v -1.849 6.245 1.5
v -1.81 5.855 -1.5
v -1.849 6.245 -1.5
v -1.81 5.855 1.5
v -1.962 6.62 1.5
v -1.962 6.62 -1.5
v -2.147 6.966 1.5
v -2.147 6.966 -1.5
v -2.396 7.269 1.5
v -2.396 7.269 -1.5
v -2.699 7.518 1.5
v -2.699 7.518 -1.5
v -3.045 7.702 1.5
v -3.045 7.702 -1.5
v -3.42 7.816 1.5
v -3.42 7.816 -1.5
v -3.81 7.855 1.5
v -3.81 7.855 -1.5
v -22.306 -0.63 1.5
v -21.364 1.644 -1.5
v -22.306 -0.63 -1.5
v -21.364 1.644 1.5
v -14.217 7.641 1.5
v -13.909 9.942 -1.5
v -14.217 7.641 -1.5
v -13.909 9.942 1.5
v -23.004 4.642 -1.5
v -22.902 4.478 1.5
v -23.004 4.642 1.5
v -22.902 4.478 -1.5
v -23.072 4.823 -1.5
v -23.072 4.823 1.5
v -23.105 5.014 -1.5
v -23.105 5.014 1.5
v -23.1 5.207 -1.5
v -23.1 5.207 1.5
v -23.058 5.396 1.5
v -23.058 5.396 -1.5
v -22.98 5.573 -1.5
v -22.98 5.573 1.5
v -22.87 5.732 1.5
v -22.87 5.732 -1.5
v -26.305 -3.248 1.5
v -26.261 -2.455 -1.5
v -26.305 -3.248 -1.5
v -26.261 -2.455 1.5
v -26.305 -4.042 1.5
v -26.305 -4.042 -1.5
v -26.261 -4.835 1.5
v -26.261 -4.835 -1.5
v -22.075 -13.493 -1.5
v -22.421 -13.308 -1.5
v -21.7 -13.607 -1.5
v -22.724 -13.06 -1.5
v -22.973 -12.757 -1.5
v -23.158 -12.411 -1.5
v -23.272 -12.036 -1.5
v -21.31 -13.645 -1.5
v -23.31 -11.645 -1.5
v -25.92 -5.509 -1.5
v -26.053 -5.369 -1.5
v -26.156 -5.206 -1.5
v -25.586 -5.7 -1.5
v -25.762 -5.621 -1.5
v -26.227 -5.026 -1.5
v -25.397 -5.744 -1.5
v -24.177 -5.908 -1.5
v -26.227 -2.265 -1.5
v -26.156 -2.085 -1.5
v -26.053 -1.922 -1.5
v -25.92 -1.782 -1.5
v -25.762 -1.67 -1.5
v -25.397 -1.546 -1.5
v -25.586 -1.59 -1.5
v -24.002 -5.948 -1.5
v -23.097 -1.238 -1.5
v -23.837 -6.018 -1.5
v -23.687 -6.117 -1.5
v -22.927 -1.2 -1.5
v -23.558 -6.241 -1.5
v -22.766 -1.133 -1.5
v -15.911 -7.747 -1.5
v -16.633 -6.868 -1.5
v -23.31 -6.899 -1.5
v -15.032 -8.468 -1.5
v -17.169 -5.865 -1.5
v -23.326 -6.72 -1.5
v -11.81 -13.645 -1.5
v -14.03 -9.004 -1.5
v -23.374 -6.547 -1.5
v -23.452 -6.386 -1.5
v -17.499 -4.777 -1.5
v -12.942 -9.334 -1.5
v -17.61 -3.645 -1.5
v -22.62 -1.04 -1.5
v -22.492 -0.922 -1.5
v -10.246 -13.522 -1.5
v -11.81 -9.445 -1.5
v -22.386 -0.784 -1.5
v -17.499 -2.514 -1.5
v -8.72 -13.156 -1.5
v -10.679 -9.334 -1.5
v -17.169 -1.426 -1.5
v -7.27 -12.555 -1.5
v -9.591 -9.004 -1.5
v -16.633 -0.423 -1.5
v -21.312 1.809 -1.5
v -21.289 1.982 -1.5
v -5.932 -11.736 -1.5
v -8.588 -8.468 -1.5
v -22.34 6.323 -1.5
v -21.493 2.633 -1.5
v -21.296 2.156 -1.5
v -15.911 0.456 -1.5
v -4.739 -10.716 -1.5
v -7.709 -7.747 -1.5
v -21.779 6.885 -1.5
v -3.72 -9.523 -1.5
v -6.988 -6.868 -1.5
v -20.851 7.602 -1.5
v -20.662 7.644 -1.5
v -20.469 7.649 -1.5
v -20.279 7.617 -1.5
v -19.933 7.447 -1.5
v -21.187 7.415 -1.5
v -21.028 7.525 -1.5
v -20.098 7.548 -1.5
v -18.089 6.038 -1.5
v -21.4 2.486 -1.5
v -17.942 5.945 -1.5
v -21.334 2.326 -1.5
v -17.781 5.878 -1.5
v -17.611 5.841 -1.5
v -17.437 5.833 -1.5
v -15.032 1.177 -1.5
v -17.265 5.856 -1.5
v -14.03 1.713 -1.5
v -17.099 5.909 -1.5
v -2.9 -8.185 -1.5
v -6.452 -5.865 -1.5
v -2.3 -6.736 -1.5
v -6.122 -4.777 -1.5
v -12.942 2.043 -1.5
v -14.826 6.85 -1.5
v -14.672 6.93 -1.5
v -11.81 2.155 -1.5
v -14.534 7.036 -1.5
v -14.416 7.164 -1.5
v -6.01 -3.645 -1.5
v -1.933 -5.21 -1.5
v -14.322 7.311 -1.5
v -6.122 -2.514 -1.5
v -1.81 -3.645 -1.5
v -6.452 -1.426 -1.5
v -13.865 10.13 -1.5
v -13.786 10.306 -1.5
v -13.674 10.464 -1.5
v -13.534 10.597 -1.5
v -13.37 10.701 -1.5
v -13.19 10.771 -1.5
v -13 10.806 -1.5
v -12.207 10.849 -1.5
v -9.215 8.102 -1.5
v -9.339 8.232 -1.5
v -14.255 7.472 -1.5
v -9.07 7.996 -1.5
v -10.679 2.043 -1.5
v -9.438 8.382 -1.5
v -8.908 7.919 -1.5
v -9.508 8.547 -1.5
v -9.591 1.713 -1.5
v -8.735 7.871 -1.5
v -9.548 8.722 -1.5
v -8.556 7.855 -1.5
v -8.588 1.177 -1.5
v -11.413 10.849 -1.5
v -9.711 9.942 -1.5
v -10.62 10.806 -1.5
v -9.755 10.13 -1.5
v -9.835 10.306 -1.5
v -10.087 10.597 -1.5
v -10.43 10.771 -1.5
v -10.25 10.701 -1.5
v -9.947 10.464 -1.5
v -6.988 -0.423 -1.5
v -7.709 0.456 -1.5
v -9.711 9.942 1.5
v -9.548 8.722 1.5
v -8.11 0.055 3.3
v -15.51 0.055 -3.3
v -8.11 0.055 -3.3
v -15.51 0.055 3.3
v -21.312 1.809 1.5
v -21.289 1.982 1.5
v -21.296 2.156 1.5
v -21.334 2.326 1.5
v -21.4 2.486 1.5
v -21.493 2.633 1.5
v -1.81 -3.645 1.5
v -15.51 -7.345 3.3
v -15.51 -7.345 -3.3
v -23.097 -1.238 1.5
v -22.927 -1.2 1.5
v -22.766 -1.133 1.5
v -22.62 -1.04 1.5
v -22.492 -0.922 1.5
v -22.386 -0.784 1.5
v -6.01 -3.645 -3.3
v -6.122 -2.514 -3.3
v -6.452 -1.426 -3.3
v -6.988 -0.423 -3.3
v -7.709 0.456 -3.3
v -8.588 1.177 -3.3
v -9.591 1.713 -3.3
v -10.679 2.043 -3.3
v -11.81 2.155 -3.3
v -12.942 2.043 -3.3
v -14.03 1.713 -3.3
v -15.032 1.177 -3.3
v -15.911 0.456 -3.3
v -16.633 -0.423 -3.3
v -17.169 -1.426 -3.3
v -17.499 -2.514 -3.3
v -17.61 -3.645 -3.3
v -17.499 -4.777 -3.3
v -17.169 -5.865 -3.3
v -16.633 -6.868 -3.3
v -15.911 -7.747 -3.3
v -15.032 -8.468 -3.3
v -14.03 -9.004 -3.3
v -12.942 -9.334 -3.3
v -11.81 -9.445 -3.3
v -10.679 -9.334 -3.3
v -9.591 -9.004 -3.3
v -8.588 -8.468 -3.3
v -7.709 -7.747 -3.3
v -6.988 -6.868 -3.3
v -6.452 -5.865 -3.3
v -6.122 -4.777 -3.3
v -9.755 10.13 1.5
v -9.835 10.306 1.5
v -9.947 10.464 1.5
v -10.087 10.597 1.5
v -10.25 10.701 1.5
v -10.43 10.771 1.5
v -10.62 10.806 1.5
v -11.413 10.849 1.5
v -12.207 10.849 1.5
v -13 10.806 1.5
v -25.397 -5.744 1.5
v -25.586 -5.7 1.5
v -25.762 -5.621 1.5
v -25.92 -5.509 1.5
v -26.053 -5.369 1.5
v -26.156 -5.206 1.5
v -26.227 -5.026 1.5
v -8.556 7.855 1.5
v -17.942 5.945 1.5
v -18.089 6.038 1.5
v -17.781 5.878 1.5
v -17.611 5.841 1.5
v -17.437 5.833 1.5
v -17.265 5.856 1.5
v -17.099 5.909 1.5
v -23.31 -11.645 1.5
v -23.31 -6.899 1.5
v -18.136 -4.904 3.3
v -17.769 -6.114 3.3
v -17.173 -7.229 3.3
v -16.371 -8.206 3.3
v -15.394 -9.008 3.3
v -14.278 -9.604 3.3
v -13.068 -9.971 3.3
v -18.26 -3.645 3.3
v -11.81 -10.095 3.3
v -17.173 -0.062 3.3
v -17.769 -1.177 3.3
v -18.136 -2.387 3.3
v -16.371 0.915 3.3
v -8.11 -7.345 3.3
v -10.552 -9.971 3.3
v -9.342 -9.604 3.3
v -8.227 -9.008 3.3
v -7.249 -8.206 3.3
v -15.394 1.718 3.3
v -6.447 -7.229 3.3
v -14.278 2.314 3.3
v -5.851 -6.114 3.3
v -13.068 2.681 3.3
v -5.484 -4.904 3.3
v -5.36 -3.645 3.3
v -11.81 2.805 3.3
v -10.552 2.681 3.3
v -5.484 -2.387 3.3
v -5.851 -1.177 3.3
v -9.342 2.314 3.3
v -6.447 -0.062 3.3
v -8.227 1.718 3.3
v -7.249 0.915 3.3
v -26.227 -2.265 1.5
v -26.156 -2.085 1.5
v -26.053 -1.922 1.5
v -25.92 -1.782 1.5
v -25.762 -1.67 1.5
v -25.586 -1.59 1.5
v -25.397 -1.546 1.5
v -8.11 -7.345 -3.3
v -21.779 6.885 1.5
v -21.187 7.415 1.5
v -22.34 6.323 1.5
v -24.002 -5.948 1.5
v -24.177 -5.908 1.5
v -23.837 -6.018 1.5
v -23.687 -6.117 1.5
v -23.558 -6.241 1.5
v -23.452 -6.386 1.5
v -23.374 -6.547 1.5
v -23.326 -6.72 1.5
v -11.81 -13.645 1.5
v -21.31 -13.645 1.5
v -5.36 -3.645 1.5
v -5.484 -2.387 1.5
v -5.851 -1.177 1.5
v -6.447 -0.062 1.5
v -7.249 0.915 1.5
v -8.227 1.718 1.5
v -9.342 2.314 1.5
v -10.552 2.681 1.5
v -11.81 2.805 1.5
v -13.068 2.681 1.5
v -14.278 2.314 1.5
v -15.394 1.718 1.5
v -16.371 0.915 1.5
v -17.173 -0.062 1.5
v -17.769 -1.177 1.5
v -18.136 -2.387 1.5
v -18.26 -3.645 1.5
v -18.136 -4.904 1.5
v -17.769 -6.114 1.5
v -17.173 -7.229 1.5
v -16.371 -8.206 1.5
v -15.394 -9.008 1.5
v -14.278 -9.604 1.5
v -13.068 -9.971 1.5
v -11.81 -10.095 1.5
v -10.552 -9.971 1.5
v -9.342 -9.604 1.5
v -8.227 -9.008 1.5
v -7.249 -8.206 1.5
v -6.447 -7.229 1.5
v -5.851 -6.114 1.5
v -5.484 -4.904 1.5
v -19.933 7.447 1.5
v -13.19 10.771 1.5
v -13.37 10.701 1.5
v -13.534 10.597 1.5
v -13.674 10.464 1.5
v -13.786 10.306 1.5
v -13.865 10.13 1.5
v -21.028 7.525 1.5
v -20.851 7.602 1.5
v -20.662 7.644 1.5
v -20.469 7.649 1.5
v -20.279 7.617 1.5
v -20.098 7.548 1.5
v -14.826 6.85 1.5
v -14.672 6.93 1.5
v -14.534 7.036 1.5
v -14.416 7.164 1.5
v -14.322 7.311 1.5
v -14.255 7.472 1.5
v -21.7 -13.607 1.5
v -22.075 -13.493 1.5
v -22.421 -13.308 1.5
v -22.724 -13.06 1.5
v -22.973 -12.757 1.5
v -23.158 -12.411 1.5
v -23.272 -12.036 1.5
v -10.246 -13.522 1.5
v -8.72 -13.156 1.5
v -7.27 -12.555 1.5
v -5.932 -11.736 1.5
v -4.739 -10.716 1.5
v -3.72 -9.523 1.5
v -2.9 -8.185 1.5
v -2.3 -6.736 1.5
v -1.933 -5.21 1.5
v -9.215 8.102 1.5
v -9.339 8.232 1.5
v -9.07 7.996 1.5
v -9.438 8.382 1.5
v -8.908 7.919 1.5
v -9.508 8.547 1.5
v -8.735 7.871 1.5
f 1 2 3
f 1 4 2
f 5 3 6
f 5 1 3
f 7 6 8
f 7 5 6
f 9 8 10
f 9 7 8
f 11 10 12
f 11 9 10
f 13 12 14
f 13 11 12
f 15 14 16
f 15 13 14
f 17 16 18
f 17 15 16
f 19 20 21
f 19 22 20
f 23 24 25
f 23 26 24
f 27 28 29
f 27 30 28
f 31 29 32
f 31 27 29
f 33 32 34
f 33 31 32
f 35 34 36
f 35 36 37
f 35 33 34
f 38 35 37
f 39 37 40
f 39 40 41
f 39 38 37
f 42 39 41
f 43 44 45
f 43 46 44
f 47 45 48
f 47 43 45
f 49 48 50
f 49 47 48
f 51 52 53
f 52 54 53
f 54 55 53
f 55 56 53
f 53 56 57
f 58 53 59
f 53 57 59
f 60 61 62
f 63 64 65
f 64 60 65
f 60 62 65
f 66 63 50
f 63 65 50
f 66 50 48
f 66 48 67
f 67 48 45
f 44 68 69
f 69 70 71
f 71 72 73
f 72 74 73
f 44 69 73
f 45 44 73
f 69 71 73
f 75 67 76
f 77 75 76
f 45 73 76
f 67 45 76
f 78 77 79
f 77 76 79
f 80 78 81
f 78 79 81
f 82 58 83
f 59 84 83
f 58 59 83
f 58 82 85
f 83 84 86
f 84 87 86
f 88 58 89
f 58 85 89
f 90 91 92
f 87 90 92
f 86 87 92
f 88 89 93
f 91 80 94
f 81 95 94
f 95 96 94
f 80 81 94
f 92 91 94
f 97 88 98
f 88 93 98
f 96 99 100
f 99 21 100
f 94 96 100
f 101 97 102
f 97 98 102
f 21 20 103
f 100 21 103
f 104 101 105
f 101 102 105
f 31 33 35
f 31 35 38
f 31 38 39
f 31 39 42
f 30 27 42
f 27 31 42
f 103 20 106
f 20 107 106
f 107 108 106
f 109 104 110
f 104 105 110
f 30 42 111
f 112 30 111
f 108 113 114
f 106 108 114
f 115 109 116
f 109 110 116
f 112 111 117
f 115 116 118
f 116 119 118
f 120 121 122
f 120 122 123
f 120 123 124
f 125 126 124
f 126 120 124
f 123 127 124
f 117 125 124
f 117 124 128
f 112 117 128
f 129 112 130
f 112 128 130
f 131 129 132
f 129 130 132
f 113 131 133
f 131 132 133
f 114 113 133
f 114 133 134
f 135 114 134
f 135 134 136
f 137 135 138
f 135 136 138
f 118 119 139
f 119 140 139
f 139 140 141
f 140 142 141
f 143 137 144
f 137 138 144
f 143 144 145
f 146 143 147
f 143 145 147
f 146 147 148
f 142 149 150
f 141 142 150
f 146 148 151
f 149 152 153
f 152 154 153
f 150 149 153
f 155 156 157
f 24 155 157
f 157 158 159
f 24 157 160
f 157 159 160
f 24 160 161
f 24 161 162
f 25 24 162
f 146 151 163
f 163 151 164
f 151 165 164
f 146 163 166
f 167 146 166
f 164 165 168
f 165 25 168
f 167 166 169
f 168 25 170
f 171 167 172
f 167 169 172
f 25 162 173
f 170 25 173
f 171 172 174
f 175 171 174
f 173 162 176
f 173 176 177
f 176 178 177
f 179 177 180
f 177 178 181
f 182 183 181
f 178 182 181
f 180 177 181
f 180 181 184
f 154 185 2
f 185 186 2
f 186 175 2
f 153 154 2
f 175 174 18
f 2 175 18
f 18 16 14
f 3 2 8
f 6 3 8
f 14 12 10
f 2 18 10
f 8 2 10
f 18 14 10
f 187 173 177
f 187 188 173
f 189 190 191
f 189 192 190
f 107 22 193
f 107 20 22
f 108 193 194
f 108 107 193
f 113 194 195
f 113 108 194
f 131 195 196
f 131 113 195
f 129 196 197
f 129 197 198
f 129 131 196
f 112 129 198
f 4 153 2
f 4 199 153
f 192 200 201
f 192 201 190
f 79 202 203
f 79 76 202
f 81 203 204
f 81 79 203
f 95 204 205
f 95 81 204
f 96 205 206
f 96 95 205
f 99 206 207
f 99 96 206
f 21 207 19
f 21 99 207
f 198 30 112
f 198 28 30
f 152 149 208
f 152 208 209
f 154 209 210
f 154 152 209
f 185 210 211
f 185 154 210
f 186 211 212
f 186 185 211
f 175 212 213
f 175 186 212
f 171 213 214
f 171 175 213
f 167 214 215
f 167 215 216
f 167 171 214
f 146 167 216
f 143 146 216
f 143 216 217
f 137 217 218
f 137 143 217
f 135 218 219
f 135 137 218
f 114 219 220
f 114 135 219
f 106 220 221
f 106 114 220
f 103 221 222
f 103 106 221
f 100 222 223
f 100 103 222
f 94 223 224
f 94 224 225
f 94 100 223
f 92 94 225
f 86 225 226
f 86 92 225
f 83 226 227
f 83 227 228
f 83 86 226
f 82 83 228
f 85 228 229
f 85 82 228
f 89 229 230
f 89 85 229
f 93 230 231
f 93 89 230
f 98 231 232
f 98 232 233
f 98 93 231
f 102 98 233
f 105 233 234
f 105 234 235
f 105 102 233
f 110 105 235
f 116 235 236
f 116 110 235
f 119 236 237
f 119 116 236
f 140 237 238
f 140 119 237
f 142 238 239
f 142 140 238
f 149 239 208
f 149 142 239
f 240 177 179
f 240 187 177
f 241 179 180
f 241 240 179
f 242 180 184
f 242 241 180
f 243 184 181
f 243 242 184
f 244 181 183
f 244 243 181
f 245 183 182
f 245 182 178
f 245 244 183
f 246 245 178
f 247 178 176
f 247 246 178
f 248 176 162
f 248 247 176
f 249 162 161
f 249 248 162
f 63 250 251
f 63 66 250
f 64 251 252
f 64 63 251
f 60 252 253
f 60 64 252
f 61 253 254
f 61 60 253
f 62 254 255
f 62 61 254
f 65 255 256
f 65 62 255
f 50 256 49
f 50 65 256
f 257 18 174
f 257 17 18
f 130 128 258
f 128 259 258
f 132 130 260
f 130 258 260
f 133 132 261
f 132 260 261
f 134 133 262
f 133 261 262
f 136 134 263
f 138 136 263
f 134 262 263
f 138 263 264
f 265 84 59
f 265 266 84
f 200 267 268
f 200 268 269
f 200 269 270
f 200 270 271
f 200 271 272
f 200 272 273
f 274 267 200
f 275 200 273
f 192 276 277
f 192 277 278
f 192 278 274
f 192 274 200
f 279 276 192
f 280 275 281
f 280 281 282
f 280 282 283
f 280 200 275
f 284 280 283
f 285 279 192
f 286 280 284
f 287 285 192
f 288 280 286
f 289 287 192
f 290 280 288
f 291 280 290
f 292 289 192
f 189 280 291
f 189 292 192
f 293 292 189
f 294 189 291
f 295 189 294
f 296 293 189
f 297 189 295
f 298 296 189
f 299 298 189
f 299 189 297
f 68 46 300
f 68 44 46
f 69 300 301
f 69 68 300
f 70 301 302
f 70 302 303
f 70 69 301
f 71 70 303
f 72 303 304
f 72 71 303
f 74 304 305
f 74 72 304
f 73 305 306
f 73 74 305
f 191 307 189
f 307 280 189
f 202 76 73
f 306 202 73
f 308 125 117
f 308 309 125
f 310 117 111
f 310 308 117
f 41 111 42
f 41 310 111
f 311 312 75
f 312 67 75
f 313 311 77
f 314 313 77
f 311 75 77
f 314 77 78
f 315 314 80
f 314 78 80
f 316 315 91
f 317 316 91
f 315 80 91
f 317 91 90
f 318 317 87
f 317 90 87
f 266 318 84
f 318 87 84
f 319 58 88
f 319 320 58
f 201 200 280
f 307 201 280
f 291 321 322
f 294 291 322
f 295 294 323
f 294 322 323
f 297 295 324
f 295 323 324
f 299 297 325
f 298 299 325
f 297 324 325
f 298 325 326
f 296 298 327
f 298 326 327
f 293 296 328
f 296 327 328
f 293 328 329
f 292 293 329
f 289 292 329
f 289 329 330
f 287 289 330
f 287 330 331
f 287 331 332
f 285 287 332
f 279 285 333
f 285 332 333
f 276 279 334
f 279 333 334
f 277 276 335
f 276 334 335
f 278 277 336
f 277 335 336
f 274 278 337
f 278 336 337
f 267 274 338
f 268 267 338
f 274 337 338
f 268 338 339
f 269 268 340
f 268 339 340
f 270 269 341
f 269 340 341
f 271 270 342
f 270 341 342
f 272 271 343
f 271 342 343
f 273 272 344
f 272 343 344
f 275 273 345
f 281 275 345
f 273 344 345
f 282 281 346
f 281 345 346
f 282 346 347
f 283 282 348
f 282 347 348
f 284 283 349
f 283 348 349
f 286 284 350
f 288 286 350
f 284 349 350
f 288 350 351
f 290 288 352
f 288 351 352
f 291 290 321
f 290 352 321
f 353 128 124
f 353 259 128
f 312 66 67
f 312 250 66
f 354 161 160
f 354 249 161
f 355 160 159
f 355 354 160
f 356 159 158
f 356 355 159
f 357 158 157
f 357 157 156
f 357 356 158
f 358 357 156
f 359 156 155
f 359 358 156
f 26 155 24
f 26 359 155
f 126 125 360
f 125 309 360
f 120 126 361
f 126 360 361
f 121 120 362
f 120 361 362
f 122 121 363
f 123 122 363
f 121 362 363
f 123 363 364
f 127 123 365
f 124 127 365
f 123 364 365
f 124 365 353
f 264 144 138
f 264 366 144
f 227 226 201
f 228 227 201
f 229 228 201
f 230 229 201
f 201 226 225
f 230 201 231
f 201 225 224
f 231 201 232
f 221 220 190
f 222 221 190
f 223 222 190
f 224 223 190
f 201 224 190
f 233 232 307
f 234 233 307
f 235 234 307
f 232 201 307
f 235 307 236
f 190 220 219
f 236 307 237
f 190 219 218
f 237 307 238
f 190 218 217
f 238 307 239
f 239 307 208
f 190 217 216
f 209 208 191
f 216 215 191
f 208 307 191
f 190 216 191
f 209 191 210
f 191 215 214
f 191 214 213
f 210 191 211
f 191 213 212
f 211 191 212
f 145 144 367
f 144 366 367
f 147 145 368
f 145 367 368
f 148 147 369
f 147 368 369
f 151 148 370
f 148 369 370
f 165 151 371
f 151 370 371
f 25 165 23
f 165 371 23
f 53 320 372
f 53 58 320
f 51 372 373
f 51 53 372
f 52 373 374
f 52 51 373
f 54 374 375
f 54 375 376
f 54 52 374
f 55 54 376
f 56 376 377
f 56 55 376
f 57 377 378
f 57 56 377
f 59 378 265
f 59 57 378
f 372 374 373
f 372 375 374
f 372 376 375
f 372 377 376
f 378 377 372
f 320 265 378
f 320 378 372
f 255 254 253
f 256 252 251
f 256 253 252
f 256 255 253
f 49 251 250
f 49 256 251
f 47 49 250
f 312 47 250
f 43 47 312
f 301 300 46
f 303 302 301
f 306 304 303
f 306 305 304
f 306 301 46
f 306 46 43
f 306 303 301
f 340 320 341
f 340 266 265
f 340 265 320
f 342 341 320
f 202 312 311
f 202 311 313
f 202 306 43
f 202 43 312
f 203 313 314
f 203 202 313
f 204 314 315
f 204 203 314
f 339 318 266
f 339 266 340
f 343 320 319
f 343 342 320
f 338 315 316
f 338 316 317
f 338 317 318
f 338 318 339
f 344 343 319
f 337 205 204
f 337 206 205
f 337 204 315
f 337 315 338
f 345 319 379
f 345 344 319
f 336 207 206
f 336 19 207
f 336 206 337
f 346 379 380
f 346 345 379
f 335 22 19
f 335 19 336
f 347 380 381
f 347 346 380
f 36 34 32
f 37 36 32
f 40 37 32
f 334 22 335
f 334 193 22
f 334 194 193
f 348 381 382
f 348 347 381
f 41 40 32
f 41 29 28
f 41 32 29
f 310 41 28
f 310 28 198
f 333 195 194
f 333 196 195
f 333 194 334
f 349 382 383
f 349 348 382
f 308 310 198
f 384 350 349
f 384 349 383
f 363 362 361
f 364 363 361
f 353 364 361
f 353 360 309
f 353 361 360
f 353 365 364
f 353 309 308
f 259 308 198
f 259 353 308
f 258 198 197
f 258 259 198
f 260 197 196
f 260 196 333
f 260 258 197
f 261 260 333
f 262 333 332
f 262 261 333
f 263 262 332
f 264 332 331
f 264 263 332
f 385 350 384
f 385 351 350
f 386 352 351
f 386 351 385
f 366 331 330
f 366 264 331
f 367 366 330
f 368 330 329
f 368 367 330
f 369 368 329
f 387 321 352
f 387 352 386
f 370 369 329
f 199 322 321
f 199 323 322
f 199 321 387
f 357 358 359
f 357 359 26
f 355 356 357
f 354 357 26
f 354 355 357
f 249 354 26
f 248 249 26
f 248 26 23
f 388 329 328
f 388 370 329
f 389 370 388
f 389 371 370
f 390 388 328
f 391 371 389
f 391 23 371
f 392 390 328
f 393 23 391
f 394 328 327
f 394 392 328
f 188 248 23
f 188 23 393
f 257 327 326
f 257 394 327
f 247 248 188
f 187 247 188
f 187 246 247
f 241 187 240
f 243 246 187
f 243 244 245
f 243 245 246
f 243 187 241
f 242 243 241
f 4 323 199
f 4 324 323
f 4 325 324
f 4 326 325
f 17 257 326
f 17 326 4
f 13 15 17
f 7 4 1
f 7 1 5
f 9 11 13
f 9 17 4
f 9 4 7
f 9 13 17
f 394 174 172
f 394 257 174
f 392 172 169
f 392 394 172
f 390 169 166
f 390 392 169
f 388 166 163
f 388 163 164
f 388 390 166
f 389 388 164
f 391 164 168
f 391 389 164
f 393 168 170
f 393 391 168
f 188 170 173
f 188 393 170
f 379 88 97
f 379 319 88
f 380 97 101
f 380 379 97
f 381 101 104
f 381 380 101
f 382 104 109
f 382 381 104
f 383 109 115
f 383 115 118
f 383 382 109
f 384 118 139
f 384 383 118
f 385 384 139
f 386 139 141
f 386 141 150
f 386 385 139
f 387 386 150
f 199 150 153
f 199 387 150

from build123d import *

# Parameters (mm, degrees)
F0_R     = 5.8
F0_W     = 7.4
F0_H     = 7.4
F1_DEPTH = 3.3
F0_R_2   = 6.5
F2_DEPTH = 1.5
F3_R     = 2
F4_R     = 1
F5_R     = 1
F6_R     = 6.45
F6_R_2   = 5.8
F7_DEPTH = 1.8


with BuildPart() as f1:
    # F0 (on Top) → F1 (new body, symmetric)
    with BuildSketch(Plane.XY):
        with Locations((-11.810101, -3.645376)):
            Circle(F0_R)
        with Locations((-11.810101, -3.645376)):
            Rectangle(F0_W, F0_H, mode=Mode.SUBTRACT)
    extrude(amount=F1_DEPTH, both=True)

    # F0 (on Top) → F2 (join, symmetric)
    with BuildSketch(Plane.XY):
        with BuildLine():
            Line((-22.810101, -13.645376), (-11.810101, -13.645376))
            ThreePointArc((-11.810101, -13.645376), (-4.739033, -10.716444), (-1.810101, -3.645376))
            Line((-1.810101, -3.645376), (-1.810101, 7.354624))
            Line((-1.810101, 7.354624), (-1.810101, 7.854624))
            Line((-1.810101, 7.854624), (-9.43136, 7.854624))
            Line((-9.43136, 7.854624), (-9.814863, 10.716693))
            ThreePointArc((-9.814863, 10.716693), (-11.810101, 10.854624), (-13.805339, 10.716693))
            Line((-13.805339, 10.716693), (-14.293907, 7.070533))
            Line((-14.293907, 7.070533), (-17.631077, 5.688232))
            Line((-17.631077, 5.688232), (-20.554771, 7.920986))
            ThreePointArc((-20.554771, 7.920986), (-22.063149, 6.607672), (-23.376464, 5.099294))
            Line((-23.376464, 5.099294), (-21.143709, 2.175599))
            Line((-21.143709, 2.175599), (-22.52601, -1.16157))
            Line((-22.52601, -1.16157), (-26.17217, -1.650138))
            ThreePointArc((-26.17217, -1.650138), (-26.310101, -3.645376), (-26.17217, -5.640615))
            Line((-26.17217, -5.640615), (-23.310101, -6.024118))
            Line((-23.310101, -6.024118), (-23.310101, -13.645376))
            Line((-23.310101, -13.645376), (-22.810101, -13.645376))
        make_face()
        with Locations((-11.810101, -3.645376)):
            Circle(F0_R_2, mode=Mode.SUBTRACT)
        with Locations((-11.810101, -3.645376)):
            Circle(F0_R_2)
        with Locations((-11.810101, -3.645376)):
            Circle(F0_R, mode=Mode.SUBTRACT)
    extrude(amount=F2_DEPTH, both=True)

    # F3
    f3_edges = [f1.edges().sort_by_distance(p)[0] for p in [
        (-23.310101, -13.645376, 0),
        (-1.810101, 7.854624, 0),
    ]]
    fillet(f3_edges, radius=F3_R)

    # F4
    f4_edges = [f1.edges().sort_by_distance(p)[0] for p in [
        (-26.17217, -5.640615, 0),
        (-26.17217, -1.650138, 0),
        (-23.376464, 5.099294, 0),
        (-20.554771, 7.920986, 0),
        (-13.805339, 10.716693, 0),
        (-9.814863, 10.716693, 0),
    ]]
    fillet(f4_edges, radius=F4_R)

    # F5
    f5_edges = [f1.edges().sort_by_distance(p)[0] for p in [
        (-23.310101, -6.024118, 0),
        (-22.52601, -1.16157, 0),
        (-21.143709, 2.175599, 0),
        (-17.631077, 5.688232, 0),
        (-14.293907, 7.070533, 0),
        (-9.43136, 7.854624, 0),
    ]]
    fillet(f5_edges, radius=F5_R)

    # F6 (on face) → F7 (join, through all)
    with BuildSketch(Plane.XY.offset(1.5)):
        with Locations((-11.810101, -3.645376)):
            Circle(F6_R)
        with Locations((-11.810101, -3.645376)):
            Circle(F6_R_2, mode=Mode.SUBTRACT)
    extrude(amount=F7_DEPTH)


solid = f1.part
